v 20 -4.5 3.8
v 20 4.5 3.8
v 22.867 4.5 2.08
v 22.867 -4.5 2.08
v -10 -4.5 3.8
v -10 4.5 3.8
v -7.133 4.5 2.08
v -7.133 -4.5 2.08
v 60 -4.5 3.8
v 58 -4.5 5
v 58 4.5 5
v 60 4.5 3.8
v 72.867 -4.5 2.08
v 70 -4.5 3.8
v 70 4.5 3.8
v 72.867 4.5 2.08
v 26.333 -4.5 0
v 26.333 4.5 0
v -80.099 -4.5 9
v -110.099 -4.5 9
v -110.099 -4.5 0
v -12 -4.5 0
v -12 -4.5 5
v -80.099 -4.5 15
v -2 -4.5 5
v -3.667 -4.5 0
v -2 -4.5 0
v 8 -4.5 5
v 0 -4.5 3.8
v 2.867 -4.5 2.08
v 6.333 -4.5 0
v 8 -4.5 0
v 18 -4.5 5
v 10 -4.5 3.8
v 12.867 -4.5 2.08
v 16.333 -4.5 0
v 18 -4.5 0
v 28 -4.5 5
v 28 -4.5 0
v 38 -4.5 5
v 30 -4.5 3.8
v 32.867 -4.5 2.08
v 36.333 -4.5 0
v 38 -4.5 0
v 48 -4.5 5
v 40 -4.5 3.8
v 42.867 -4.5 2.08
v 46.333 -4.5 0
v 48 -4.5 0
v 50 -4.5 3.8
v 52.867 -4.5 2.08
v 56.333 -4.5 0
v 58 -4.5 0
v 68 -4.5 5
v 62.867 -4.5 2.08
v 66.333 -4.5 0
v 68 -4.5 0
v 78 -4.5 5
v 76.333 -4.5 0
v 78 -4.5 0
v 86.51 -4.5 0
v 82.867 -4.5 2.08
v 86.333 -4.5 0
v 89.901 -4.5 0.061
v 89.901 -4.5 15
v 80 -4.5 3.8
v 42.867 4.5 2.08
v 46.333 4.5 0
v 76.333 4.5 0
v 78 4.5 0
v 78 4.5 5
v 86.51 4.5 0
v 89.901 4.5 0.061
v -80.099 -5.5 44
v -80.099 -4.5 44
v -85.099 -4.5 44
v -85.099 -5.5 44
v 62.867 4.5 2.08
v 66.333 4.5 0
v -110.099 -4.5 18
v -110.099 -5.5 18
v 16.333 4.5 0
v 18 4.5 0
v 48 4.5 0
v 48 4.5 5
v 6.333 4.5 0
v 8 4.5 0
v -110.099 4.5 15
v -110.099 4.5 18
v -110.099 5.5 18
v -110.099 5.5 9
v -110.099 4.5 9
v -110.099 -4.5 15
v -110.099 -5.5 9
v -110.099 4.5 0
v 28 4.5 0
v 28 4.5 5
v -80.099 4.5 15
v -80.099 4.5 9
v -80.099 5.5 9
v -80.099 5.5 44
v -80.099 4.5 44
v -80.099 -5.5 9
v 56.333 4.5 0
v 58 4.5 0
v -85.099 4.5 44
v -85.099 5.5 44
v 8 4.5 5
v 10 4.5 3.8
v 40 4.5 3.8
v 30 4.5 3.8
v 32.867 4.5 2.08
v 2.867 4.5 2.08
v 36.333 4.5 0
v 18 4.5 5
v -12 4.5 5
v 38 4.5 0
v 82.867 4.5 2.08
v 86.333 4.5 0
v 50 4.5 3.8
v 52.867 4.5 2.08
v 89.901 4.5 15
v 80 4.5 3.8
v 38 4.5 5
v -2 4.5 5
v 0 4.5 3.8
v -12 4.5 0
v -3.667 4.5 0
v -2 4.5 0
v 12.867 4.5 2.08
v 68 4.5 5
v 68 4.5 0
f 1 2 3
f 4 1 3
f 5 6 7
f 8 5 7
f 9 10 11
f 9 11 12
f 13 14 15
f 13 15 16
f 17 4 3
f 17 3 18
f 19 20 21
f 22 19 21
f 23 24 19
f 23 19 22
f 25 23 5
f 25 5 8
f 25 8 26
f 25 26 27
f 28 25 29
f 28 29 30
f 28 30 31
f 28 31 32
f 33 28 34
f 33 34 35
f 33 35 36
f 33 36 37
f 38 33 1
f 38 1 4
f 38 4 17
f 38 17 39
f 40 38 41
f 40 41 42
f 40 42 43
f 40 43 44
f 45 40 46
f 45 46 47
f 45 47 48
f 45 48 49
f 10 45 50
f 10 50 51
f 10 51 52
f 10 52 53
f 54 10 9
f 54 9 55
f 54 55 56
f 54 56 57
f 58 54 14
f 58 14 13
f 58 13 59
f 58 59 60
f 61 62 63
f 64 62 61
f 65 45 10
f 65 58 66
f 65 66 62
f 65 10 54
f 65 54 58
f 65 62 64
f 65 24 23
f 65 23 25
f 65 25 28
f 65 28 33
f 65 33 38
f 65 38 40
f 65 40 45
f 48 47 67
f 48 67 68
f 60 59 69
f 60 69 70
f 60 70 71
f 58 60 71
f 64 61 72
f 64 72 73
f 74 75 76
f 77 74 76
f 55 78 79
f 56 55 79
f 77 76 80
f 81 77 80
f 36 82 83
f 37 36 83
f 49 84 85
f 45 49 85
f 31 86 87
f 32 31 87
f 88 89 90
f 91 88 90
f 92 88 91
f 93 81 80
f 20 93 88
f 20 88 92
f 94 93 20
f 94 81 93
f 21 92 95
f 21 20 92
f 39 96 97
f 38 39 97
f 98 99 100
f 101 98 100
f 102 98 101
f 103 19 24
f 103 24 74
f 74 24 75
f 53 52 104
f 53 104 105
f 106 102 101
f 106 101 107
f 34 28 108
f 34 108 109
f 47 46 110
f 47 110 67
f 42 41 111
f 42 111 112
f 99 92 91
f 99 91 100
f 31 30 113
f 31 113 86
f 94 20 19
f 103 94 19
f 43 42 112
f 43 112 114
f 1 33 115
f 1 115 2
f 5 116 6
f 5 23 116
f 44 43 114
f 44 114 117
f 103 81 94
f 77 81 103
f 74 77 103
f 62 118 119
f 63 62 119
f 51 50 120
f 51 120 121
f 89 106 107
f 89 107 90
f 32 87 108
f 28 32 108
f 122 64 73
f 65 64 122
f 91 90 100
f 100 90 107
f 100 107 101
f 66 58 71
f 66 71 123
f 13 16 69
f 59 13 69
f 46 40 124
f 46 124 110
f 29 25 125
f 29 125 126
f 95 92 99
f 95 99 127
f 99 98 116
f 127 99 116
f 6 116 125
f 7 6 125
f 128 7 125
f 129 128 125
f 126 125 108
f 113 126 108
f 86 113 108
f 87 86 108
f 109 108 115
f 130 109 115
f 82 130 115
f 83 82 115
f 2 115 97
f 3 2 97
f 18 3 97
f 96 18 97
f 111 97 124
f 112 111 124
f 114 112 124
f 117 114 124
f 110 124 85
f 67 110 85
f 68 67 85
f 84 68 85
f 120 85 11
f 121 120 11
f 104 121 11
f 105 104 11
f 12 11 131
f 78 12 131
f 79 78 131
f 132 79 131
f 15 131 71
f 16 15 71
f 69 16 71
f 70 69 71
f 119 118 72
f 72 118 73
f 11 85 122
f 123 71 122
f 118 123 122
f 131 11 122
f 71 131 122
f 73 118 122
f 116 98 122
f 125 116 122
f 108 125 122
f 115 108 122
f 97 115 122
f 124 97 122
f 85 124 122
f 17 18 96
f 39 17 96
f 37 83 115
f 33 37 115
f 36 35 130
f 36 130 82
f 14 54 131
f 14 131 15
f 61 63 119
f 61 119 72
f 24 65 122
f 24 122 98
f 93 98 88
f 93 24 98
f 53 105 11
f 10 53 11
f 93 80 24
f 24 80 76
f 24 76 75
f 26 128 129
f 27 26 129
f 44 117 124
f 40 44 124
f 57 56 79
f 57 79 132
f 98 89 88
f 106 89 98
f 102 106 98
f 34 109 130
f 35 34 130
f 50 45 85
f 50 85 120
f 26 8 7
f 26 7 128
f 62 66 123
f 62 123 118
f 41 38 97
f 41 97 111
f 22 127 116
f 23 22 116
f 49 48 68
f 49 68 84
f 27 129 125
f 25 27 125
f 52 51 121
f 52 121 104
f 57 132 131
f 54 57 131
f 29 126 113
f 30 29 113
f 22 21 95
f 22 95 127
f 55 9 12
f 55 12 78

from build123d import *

# Parameters (mm, degrees)
F1_DEPTH = 4.5
F4_DEPTH = 1


with BuildPart() as f1:
    # F0 (on Front) → F1 (new body, symmetric)
    with BuildSketch(Plane.XZ):
        Polygon((-10, 3.8), (-7.132532, 2.079519), (-3.666667, 0), (-3.48962, 0), (-2, 0), (-2, 5), (0, 3.8), (2.867468, 2.079519), (6.333333, 0), (6.51038, 0), (8, 0), (8, 5), (10, 3.8), (12.867468, 2.079519), (16.333333, 0), (16.51038, 0), (18, 0), (18, 5), (20, 3.8), (22.867468, 2.079519), (26.333333, 0), (26.51038, 0), (28, 0), (28, 5), (30, 3.8), (32.867468, 2.079519), (36.333333, 0), (36.51038, 0), (38, 0), (38, 5), (40, 3.8), (42.867468, 2.079519), (46.333333, 0), (46.51038, 0), (48, 0), (48, 5), (50, 3.8), (52.867468, 2.079519), (56.333333, 0), (56.51038, 0), (58, 0), (58, 5), (60, 3.8), (62.867468, 2.079519), (66.333333, 0), (66.51038, 0), (68, 0), (68, 5), (70, 3.8), (72.867468, 2.079519), (76.333333, 0), (76.51038, 0), (78, 0), (78, 5), (80, 3.8), (82.867468, 2.079519), (86.333333, 0), (86.51038, 0), (89.901179, 0.061058), (89.901179, 15), (-110.098821, 15), (-110.098821, 0), (-12, 0), (-12, 5), align=None)
    extrude(amount=F1_DEPTH, both=True)

    # F3 (on offset) → F4 (join)
    with BuildSketch(Plane.XZ.offset(4.5)):
        Polygon((-80.098821, 44), (-85.098821, 44), (-110.098821, 18), (-110.098821, 9), (-80.098821, 9), align=None)
    extrude(amount=F4_DEPTH)

    # F5: F1 across plane


with BuildPart() as f1_1:
    add(f1.part)
    add(f1.part.mirror(Plane.XZ))


solid = f1_1.part
